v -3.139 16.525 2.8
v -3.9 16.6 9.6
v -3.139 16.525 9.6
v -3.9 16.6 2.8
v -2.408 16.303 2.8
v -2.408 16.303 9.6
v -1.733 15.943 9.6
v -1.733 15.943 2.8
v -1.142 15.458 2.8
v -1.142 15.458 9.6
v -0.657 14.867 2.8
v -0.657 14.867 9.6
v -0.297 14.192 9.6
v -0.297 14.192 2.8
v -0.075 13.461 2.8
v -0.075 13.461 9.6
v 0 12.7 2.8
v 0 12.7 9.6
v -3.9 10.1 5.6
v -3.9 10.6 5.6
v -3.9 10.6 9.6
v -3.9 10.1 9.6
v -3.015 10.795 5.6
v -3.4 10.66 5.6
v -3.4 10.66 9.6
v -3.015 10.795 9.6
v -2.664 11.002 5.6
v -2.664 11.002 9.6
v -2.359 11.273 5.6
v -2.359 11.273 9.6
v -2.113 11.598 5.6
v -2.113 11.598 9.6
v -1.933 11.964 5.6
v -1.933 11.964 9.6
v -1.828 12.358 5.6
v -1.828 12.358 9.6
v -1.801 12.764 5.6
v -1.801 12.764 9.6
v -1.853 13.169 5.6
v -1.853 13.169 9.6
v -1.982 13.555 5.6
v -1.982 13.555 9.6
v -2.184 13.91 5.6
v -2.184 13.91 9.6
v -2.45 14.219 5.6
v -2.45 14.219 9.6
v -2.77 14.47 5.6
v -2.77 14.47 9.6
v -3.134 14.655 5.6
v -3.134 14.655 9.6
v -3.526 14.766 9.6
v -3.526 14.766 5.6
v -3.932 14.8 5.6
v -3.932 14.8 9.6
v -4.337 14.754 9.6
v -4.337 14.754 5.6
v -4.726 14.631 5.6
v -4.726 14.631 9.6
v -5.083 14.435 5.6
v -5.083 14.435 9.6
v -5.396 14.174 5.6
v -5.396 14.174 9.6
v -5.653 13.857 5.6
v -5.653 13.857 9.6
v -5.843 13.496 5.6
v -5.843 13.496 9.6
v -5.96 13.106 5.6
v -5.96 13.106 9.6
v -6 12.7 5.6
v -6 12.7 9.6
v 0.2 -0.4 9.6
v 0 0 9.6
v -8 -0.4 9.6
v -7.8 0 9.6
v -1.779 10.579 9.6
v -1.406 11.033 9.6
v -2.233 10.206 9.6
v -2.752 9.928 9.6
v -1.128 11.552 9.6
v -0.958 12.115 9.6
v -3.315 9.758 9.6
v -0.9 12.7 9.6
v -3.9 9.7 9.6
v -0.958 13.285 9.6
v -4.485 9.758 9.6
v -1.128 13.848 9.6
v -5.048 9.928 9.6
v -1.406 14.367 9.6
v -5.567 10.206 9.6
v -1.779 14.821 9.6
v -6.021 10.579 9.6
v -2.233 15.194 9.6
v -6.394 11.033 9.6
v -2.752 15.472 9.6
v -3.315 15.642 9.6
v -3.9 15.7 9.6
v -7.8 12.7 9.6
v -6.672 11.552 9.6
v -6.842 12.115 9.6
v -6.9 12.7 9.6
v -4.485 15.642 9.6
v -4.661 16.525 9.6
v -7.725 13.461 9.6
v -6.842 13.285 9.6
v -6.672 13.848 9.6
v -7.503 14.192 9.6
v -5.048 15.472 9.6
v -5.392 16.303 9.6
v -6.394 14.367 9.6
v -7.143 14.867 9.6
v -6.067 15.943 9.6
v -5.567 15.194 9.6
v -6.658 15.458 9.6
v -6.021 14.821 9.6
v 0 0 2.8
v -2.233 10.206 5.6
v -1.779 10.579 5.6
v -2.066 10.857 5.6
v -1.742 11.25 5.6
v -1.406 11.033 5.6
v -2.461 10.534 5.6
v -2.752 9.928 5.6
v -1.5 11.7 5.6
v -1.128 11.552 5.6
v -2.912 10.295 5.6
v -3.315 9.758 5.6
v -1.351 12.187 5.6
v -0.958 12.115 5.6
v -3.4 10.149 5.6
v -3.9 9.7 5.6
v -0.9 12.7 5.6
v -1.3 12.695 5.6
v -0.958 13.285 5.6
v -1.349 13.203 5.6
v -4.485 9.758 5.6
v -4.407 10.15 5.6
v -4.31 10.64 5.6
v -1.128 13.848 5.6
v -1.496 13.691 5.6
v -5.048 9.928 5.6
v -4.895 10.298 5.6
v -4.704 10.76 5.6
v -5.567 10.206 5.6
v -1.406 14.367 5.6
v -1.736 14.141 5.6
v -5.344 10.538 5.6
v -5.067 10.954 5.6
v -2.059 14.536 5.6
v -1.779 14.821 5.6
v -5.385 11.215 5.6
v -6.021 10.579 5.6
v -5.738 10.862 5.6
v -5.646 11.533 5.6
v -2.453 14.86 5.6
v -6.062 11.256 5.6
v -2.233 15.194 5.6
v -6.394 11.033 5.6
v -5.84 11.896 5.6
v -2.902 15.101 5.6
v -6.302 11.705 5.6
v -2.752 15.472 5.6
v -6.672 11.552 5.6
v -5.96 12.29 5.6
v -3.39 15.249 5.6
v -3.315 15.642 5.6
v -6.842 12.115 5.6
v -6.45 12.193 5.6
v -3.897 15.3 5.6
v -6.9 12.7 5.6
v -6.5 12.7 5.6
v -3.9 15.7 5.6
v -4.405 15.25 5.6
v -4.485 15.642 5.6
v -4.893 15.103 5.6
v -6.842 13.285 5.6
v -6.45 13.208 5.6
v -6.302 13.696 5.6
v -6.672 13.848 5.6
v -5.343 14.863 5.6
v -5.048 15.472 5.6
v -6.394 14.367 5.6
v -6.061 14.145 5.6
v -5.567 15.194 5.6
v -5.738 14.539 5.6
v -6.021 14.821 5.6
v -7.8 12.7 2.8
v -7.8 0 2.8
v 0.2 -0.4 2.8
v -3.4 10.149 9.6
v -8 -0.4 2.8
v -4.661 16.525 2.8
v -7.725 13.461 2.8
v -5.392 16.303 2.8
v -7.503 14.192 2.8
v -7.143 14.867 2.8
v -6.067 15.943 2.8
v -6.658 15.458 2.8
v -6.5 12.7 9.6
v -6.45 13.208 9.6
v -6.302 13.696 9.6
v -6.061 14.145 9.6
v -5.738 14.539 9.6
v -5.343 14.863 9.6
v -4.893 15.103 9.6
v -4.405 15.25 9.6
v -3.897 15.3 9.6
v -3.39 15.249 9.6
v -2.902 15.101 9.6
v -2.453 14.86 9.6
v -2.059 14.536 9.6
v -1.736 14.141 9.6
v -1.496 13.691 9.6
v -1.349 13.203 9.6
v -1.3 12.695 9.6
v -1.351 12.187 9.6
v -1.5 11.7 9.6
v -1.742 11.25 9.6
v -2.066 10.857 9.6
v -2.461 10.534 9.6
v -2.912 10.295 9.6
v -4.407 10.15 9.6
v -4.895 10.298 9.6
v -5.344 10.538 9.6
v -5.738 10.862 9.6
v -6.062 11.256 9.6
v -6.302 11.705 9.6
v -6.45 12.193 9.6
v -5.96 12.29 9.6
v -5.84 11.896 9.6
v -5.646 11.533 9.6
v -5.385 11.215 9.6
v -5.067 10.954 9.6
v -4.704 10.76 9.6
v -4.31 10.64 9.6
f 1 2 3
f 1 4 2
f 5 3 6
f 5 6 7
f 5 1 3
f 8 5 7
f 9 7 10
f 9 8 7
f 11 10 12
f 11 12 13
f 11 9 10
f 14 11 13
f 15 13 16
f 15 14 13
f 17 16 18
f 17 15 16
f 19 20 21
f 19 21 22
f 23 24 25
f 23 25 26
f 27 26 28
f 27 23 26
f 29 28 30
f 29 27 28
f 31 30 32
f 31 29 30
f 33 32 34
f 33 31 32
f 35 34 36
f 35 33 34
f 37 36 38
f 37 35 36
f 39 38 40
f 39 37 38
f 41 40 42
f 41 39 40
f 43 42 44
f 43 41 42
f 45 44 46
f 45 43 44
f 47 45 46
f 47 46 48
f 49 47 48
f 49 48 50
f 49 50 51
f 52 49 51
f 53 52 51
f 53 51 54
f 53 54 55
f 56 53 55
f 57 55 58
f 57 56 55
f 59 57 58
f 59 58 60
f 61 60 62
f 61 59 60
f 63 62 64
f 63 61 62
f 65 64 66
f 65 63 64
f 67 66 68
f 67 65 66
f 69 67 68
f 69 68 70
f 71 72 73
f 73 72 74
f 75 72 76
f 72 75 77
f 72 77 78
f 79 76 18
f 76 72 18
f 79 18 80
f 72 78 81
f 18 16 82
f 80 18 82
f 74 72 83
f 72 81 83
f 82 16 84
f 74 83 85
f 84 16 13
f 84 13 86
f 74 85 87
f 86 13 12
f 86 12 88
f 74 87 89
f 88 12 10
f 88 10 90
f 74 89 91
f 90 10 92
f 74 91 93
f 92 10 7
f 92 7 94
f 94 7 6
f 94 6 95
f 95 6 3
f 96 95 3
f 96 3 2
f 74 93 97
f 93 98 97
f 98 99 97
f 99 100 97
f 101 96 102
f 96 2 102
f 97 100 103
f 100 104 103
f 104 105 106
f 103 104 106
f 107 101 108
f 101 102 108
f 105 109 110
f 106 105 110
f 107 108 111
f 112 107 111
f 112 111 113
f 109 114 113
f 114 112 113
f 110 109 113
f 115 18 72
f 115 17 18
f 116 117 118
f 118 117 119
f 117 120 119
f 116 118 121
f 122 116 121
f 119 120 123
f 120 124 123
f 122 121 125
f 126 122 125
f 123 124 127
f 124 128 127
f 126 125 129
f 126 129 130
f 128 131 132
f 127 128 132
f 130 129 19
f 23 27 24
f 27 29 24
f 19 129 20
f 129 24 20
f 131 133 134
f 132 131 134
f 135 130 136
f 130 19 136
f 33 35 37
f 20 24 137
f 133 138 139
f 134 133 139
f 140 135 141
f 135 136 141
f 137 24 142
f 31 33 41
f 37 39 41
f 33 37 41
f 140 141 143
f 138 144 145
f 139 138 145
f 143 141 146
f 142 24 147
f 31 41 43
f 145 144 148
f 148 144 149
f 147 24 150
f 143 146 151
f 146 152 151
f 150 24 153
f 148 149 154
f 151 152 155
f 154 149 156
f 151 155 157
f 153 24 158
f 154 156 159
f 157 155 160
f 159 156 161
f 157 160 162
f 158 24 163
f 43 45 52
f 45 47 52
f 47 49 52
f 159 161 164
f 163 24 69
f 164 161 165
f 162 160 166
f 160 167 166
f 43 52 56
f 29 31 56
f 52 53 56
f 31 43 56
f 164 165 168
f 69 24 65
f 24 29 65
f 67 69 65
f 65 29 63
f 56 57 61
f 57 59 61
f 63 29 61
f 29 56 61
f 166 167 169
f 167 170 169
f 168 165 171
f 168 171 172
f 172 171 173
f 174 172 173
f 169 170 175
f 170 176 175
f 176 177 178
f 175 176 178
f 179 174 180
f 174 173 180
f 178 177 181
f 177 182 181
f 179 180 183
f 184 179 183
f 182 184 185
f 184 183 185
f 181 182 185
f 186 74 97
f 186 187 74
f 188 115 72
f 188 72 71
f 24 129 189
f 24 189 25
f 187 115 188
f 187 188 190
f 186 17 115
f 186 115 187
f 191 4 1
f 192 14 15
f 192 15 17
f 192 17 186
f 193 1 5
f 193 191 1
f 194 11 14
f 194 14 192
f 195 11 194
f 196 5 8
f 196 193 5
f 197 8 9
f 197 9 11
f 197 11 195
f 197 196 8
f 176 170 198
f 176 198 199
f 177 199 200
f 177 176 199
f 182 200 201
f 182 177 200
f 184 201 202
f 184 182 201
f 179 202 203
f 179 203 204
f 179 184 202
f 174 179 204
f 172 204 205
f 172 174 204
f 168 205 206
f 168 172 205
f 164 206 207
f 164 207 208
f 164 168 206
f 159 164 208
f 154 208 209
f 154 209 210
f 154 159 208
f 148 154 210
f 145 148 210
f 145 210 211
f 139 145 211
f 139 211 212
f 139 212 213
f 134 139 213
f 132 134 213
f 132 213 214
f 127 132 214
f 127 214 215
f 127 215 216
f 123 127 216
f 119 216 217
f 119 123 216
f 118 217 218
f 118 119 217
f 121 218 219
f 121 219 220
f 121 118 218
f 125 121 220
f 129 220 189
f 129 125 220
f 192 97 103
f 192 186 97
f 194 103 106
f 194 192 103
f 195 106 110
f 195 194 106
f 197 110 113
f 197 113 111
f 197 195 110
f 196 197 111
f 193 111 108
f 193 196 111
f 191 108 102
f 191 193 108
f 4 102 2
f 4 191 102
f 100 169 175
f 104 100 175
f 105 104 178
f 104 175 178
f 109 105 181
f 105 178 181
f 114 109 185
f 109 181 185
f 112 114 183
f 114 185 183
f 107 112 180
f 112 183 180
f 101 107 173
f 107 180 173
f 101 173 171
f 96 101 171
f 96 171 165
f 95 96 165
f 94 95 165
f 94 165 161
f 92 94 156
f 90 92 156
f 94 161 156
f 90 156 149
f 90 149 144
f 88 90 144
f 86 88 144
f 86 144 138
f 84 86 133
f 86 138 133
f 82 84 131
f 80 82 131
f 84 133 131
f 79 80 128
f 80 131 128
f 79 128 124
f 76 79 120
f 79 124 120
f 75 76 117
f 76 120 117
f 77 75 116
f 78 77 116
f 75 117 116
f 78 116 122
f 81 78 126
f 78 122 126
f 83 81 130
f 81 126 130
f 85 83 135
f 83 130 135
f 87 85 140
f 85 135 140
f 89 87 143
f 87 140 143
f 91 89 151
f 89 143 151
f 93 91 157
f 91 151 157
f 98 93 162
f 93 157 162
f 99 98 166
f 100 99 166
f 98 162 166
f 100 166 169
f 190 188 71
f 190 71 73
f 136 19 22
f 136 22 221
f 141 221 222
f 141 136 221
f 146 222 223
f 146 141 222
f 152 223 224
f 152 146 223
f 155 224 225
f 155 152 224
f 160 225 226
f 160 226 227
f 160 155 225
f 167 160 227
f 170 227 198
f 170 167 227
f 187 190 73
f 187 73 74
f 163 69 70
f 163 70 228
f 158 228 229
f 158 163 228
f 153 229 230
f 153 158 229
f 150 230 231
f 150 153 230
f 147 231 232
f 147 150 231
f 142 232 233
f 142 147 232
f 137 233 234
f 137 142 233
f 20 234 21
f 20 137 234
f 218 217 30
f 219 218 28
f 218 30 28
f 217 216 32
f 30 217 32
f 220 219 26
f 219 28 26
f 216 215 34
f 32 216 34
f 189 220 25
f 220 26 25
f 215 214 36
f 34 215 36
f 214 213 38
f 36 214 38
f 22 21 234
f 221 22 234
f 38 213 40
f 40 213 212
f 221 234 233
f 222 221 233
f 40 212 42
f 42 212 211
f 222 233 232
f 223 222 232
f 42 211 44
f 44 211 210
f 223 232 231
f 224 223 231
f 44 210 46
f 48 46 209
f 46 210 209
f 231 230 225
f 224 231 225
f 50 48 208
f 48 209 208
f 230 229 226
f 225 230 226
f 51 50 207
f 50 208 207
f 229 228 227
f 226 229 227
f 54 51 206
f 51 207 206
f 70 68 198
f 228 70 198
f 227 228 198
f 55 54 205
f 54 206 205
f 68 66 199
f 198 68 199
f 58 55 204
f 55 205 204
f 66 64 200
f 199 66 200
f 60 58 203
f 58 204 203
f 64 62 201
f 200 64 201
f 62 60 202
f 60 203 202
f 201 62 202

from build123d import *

# Parameters (mm, degrees)
F0_R     = 3
F1_DEPTH = 2.8
F2_DEPTH = 4
F3_ANGLE = 180


with BuildPart() as f1:
    # F0 (on Top) → F1 (new body)
    with BuildSketch(Plane.XY):
        with BuildLine():
            Line((0, 12.7), (0, 0))
            Line((0, 0), (-0.2, -0.4))
            Line((-0.2, -0.4), (8, -0.4))
            Line((8, -0.4), (7.8, 0))
            Line((7.8, 0), (7.8, 12.7))
            ThreePointArc((7.8, 12.7), (6.6577164466, 15.4577164466), (3.9, 16.6))
            ThreePointArc((3.9, 16.6), (1.1422835534, 15.4577164466), (0, 12.7))
        make_face()
        with Locations((3.9, 12.7)):
            Circle(F0_R, mode=Mode.SUBTRACT)
        with Locations((3.9, 12.7)):
            Circle(F0_R)
        with BuildLine():
            ThreePointArc((3.9, 10.1), (3.6488251879, 10.1121608988), (3.4, 10.1485298356))
            ThreePointArc((3.4, 10.1485298356), (2.2477288358, 14.70748599), (6.5, 12.7))
            ThreePointArc((6.5, 12.7), (5.7384776311, 10.8615223689), (3.9, 10.1))
        make_face(mode=Mode.SUBTRACT)
        with BuildLine():
            ThreePointArc((3.9, 10.6), (5.3849242405, 11.2150757595), (6, 12.7))
            ThreePointArc((6, 12.7), (2.6038518603, 14.3522711642), (3.4, 10.6603921946))
            ThreePointArc((3.4, 10.6603921946), (3.6481829944, 10.6151527165), (3.9, 10.6))
        make_face()
        with BuildLine():
            ThreePointArc((3.4, 10.6603921946), (2.6038518603, 14.3522711642), (6, 12.7))
            ThreePointArc((6, 12.7), (5.3849242405, 11.2150757595), (3.9, 10.6))
            Line((3.9, 10.6), (3.9, 10.1))
            ThreePointArc((3.9, 10.1), (5.7384776311, 10.8615223689), (6.5, 12.7))
            ThreePointArc((6.5, 12.7), (2.2477288358, 14.70748599), (3.4, 10.1485298356))
            Line((3.4, 10.1485298356), (3.4, 10.6603921946))
        make_face()
        with BuildLine():
            ThreePointArc((3.9, 10.6), (3.6481829944, 10.6151527165), (3.4, 10.6603921946))
            Line((3.4, 10.6603921946), (3.4, 10.1485298356))
            ThreePointArc((3.4, 10.1485298356), (3.6488251879, 10.1121608988), (3.9, 10.1))
            Line((3.9, 10.1), (3.9, 10.6))
        make_face()
    extrude(amount=F1_DEPTH)

    # F0 (on Top) → F2 (join)
    with BuildSketch(Plane.XY):
        with BuildLine():
            Line((0, 12.7), (0, 0))
            Line((0, 0), (-0.2, -0.4))
            Line((-0.2, -0.4), (8, -0.4))
            Line((8, -0.4), (7.8, 0))
            Line((7.8, 0), (7.8, 12.7))
            ThreePointArc((7.8, 12.7), (6.6577164466, 15.4577164466), (3.9, 16.6))
            ThreePointArc((3.9, 16.6), (1.1422835534, 15.4577164466), (0, 12.7))
        make_face()
        with Locations((3.9, 12.7)):
            Circle(F0_R, mode=Mode.SUBTRACT)
        with BuildLine():
            ThreePointArc((3.4, 10.6603921946), (2.6038518603, 14.3522711642), (6, 12.7))
            ThreePointArc((6, 12.7), (5.3849242405, 11.2150757595), (3.9, 10.6))
            Line((3.9, 10.6), (3.9, 10.1))
            ThreePointArc((3.9, 10.1), (5.7384776311, 10.8615223689), (6.5, 12.7))
            ThreePointArc((6.5, 12.7), (2.2477288358, 14.70748599), (3.4, 10.1485298356))
            Line((3.4, 10.1485298356), (3.4, 10.6603921946))
        make_face()
    extrude(amount=-F2_DEPTH)


with BuildPart() as f1_1:
    # F3: moved
    add(f1.part.rotate(Axis((0, 6.35, 2.8), (0, 1, 0)), F3_ANGLE))


solid = f1_1.part
